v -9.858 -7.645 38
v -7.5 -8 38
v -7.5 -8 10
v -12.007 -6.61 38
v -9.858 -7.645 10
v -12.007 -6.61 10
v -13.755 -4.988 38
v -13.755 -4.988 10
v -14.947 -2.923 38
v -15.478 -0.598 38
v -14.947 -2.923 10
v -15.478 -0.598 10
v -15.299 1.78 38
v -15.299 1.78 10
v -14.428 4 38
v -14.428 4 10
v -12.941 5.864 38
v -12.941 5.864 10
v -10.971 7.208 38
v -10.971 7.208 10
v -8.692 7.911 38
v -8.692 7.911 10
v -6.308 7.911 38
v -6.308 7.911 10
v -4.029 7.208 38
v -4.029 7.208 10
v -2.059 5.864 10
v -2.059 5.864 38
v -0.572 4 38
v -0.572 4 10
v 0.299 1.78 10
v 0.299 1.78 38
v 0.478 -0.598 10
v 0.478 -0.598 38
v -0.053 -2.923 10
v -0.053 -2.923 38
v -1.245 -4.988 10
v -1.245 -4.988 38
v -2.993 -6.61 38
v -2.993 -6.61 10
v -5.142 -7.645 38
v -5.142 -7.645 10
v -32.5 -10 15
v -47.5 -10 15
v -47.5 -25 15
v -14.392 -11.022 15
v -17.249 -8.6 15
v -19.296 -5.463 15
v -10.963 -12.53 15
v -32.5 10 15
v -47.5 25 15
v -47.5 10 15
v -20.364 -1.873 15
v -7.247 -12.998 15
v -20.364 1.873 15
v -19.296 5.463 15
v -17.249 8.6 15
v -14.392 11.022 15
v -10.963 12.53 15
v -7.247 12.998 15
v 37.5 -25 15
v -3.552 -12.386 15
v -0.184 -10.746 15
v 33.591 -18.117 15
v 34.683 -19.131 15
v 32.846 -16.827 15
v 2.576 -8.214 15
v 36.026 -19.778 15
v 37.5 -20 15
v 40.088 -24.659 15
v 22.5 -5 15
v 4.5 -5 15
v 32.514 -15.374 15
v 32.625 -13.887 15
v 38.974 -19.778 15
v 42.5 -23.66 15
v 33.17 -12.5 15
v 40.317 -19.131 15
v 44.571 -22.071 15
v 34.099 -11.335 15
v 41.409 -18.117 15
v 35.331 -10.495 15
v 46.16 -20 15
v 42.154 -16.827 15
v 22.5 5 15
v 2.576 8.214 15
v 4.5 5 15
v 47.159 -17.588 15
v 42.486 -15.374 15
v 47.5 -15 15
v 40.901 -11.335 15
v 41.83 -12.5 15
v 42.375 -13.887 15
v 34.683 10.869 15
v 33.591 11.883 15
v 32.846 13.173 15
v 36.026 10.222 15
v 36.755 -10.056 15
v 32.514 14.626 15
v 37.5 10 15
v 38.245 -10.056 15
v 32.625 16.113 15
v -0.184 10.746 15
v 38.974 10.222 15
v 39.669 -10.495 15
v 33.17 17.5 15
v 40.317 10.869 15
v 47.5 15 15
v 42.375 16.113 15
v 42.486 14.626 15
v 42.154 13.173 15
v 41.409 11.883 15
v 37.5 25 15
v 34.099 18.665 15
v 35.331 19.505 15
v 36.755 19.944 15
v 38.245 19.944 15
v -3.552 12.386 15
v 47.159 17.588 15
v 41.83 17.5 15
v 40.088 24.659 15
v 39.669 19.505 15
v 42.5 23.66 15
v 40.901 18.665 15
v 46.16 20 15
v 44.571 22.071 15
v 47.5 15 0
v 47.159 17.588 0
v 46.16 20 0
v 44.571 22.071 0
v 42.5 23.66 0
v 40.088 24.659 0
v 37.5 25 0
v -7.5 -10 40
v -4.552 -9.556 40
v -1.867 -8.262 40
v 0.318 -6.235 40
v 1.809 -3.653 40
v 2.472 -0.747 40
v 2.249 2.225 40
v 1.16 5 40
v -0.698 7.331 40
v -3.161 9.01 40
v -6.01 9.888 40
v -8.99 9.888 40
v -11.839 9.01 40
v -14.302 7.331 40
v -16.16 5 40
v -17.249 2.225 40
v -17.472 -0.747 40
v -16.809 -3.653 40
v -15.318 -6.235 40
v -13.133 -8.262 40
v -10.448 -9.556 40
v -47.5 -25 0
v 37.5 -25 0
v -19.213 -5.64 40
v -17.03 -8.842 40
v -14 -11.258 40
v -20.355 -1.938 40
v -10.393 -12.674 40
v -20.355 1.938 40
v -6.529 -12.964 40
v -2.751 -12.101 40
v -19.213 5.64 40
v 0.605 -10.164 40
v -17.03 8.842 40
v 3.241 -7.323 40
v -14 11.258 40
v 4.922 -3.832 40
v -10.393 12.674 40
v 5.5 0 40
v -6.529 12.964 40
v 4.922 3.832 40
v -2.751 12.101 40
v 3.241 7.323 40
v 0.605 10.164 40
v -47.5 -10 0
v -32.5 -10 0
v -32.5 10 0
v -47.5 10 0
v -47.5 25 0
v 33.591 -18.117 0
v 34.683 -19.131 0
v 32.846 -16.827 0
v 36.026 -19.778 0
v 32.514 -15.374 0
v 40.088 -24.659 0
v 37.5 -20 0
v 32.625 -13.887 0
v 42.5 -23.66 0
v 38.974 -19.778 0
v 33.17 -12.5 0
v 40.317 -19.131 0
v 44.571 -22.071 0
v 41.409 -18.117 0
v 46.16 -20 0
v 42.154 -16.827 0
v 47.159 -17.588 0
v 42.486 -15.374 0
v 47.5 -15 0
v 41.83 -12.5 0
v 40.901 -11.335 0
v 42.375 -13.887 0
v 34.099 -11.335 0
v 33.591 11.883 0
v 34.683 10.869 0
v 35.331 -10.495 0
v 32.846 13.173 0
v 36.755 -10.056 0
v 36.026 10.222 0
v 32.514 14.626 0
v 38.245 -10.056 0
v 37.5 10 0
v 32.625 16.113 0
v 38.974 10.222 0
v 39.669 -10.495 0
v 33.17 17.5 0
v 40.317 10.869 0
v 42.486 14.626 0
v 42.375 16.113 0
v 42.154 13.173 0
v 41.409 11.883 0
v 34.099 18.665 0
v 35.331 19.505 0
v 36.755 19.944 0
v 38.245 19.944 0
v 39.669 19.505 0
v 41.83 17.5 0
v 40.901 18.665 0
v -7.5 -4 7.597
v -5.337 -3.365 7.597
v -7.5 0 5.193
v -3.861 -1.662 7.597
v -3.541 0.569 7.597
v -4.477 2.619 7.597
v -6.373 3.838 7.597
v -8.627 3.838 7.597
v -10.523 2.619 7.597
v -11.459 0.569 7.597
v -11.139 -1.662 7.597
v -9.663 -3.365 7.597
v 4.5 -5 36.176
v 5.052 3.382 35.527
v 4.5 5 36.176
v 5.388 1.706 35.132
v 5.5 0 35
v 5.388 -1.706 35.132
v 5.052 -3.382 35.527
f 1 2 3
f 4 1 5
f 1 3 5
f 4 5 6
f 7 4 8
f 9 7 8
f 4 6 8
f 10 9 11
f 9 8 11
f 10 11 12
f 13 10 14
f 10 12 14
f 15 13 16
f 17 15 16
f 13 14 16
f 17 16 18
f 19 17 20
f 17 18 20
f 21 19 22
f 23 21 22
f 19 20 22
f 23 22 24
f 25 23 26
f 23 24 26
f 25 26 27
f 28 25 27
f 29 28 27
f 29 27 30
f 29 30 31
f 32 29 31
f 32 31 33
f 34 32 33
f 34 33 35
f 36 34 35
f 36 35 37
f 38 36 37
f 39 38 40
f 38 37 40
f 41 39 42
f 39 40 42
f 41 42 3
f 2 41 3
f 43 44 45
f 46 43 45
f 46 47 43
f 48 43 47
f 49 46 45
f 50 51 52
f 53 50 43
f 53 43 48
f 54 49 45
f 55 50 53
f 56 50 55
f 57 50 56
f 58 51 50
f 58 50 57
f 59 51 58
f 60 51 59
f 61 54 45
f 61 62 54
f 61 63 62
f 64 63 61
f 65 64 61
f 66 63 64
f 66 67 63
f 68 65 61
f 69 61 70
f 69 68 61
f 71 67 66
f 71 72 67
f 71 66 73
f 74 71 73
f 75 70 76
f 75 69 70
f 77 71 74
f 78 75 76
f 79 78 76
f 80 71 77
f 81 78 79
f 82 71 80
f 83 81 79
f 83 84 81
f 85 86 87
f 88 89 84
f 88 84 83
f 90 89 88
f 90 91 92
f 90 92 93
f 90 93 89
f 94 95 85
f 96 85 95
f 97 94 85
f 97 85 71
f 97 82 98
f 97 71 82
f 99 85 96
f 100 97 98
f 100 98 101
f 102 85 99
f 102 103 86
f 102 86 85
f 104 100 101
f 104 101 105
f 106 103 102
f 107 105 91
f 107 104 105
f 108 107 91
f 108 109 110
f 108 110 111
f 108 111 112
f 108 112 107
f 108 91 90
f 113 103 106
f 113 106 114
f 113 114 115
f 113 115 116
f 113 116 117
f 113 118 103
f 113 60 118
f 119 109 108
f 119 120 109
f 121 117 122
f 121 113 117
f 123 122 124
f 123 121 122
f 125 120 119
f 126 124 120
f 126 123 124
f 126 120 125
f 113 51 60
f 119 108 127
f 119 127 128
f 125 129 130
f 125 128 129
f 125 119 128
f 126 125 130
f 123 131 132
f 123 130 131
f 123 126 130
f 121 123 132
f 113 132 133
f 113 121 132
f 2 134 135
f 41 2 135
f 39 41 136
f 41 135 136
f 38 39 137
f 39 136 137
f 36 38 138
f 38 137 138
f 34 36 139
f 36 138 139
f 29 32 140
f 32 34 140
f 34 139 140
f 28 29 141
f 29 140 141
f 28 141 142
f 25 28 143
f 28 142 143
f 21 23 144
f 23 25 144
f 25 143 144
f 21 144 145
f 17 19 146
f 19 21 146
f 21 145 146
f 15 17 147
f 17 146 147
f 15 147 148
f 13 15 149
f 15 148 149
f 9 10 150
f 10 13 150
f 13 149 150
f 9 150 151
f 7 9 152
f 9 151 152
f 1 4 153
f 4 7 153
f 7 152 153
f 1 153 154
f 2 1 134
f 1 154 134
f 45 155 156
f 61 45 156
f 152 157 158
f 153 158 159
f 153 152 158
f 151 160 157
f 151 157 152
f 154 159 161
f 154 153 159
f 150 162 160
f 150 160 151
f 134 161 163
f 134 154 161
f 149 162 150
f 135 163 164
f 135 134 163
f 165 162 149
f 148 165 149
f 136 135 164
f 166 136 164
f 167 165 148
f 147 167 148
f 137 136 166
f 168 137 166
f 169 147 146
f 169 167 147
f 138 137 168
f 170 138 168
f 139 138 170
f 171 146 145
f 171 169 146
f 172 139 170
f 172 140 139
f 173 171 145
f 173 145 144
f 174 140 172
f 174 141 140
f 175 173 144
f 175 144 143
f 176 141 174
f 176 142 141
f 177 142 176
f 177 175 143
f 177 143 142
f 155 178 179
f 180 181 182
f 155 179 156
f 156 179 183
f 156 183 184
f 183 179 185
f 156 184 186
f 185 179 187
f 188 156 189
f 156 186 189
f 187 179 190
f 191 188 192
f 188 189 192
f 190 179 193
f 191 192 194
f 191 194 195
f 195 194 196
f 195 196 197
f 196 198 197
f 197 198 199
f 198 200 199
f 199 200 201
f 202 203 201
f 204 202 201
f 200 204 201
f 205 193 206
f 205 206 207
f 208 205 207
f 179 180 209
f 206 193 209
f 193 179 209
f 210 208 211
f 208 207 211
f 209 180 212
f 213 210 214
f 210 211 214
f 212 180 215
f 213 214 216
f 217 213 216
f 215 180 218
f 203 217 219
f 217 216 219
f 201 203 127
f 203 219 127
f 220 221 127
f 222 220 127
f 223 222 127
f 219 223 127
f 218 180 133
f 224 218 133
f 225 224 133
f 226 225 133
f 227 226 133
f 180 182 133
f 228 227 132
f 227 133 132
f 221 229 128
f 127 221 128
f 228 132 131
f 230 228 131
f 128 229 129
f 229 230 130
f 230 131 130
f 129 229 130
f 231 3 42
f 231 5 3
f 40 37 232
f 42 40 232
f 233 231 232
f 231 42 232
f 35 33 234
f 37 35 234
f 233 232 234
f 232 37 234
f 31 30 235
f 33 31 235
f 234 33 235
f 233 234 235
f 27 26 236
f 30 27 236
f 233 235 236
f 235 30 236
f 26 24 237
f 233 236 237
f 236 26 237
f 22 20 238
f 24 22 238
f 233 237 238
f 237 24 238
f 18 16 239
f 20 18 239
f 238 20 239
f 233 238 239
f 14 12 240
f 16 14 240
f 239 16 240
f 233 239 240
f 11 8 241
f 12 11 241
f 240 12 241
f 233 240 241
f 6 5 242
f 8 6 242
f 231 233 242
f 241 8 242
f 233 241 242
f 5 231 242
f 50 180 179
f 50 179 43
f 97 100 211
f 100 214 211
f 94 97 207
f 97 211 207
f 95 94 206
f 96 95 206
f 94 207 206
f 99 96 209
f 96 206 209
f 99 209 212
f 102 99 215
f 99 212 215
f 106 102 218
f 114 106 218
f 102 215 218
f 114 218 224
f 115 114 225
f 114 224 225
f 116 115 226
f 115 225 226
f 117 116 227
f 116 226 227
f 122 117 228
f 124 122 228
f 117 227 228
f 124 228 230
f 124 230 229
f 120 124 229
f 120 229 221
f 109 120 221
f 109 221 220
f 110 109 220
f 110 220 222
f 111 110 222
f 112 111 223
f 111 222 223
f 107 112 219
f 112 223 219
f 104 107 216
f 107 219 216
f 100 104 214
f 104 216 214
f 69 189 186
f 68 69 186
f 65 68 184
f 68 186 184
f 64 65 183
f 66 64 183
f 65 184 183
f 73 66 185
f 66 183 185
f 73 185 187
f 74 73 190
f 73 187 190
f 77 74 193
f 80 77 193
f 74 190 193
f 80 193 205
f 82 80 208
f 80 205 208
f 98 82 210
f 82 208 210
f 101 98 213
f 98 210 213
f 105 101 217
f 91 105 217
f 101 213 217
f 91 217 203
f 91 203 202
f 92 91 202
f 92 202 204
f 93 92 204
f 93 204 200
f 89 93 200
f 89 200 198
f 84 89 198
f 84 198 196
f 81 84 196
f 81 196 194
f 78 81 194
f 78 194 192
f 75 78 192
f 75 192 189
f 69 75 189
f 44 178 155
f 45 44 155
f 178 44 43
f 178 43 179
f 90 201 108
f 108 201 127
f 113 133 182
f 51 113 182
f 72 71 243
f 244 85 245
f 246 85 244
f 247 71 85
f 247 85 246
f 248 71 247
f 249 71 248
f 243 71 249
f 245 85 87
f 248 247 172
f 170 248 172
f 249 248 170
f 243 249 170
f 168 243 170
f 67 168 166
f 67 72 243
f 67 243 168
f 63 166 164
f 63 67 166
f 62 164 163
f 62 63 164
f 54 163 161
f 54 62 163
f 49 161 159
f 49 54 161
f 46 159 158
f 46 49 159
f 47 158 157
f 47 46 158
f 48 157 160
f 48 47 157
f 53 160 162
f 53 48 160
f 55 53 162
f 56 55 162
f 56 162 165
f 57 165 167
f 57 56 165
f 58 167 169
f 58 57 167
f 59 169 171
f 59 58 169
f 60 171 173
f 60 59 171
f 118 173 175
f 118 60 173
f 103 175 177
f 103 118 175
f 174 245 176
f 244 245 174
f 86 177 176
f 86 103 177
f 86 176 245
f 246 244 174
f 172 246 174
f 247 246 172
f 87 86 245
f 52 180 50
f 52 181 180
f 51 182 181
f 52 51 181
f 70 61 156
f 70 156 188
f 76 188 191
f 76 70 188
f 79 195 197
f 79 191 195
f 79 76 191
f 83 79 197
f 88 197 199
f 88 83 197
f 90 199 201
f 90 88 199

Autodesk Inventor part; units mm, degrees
ref_plane "YZ Plane" through (0, 0, 0) normal (1, 0, 0) x (0, 1, 0)
ref_plane "XZ Plane" through (0, 0, 0) normal (0, 1, 0) x (-1, 0, 0)
ref_plane "XY Plane" through (0, 0, 0) normal (0, 0, 1) x (1, 0, 0)
sketch "Эскиз1" plane through (0, 0, 0) normal (0, 0, 1) x (1, 0, 0)
  line L0 (-47.5, -25) -> (47.5, -25)
  line L1 (47.5, -25) -> (47.5, 25)
  line L2 (47.5, 25) -> (-47.5, 25)
  line L3 (-47.5, 25) -> (-47.5, -25)
  line L4 (-47.5, -25) -> (47.5, 25) construction
  line L5 (47.5, -25) -> (-47.5, 25) construction
  point P0 (0, 0)
  dimension "d0" = 95
  dimension "d1" = 50
extrude "Выдавливание1" add sketch "Эскиз1" along normal blind 15
sketch "Эскиз2" plane through (-47.5, -25, 0) normal (-1, 0, 0) x (0, 0, 1)
  point P0 (0, 25)
sketch "Эскиз3" plane through (-47.5, -25, 0) normal (-1, 0, 0) x (0, 0, 1)
  line L0 (15, 0) -> (15, 50) projected
  line L1 (0, 35) -> (15, 35)
  line L2 (15, 35) -> (15, 15)
  line L3 (15, 15) -> (0, 15)
  line L4 (0, 15) -> (0, 35)
  line L5 (0, 25) -> (15, 25)
  dimension "d4" = 20
extrude "Выдавливание2" cut sketch "Эскиз3" against normal blind 15
fillet "Сопряжение1" radius 10 1 edges at (47.5, 25, 7.5)
fillet "Сопряжение2" radius 10 1 edges at (47.5, -25, 7.5)
sketch "Эскиз4" plane through (0, 0, 15) normal (0, 0, 1) x (1, 0, 0)
  line L0 (0, 0) -> (47.5, 0)
  line L1 (47.5, -15) -> (47.5, 15) projected
  line L2 (-47.5, 25) -> (-47.5, 10) projected
  point P0 (37.5, 15)
  point P1 (37.5, -15)
  dimension "d9" = 30
  dimension "d10" = 85
hole "Отверстие1" at (37.5, 15, 15) at (37.5, -15, 15) direction (0, 0, -1) diameter 10 end through all
sketch "Эскиз5" plane through (0, 0, 15) normal (0, 0, 1) x (1, 0, 0)
  circle A0 centre (-7.5, 0) radius 13
  line L0 (-47.5, 25) -> (-47.5, 10) projected
  point P0 (0, 0)
  dimension "d18" = 26
  dimension "d19" = 40
extrude "Выдавливание3" add sketch "Эскиз5" along normal blind 25
sketch "Эскиз6" plane through (-7.5, 0, 40) normal (0, 0, 1) x (1, 0, 0)
  point P0 (7.5, 0)
  point P1 (0, 0)
hole "Отверстие2" at (-7.5, 0, 40) direction (0, 0, -1) diameter 16 depth 30 tip angle 118 clearance for "болты с шестигранной головкой / гайка ГОСТ 12876-67" size "M16" standard "ГОСТ"
chamfer "Фаска1" distance 2 angle 45 1 edges at (-7.5, 8, 40)
sketch "Эскиз7" plane through (0, 0, 15) normal (0, 0, 1) x (1, 0, 0)
  point P0 (0, 0)
sketch "Эскиз8" plane through (0, 0, 0) normal (0, 1, 0) x (-1, 0, 0)
  line L0 (20.5, 40) -> (-5.5, 40) projected
  line L1 (0, 40) -> (-11.4909, 40)
  line L2 (-11.4909, 40) -> (-5.5, 35)
  line L3 (-5.5, 15) -> (-5.5, 40) projected
  line L4 (-5.5, 35) -> (-22.5, 15)
  line L5 (47.5, 0) -> (47.5, 15) projected
  line L6 (-22.5, 15) -> (47.5, 15)
  line L7 (-5.5, 35) -> (-1.25, 40)
  line L8 (17.5, 40) -> (-2.5, 40) projected
  line L9 (-2.5, 40) -> (-0.5, 38) projected
  line L10 (-1.8243, 39.3243) -> (-1.8243, 15)
  line L11 (-37.5, 15) -> (47.5, 15) projected
  point P0 (0, 0)
  dimension "d32" = 70
  dimension "d33" = 5
extrude "Выдавливание4" add sketch "Эскиз8" along normal mid plane 10 contours L10 L6 L3 L7 | L3 L6 L4
properties part number "Основание"
